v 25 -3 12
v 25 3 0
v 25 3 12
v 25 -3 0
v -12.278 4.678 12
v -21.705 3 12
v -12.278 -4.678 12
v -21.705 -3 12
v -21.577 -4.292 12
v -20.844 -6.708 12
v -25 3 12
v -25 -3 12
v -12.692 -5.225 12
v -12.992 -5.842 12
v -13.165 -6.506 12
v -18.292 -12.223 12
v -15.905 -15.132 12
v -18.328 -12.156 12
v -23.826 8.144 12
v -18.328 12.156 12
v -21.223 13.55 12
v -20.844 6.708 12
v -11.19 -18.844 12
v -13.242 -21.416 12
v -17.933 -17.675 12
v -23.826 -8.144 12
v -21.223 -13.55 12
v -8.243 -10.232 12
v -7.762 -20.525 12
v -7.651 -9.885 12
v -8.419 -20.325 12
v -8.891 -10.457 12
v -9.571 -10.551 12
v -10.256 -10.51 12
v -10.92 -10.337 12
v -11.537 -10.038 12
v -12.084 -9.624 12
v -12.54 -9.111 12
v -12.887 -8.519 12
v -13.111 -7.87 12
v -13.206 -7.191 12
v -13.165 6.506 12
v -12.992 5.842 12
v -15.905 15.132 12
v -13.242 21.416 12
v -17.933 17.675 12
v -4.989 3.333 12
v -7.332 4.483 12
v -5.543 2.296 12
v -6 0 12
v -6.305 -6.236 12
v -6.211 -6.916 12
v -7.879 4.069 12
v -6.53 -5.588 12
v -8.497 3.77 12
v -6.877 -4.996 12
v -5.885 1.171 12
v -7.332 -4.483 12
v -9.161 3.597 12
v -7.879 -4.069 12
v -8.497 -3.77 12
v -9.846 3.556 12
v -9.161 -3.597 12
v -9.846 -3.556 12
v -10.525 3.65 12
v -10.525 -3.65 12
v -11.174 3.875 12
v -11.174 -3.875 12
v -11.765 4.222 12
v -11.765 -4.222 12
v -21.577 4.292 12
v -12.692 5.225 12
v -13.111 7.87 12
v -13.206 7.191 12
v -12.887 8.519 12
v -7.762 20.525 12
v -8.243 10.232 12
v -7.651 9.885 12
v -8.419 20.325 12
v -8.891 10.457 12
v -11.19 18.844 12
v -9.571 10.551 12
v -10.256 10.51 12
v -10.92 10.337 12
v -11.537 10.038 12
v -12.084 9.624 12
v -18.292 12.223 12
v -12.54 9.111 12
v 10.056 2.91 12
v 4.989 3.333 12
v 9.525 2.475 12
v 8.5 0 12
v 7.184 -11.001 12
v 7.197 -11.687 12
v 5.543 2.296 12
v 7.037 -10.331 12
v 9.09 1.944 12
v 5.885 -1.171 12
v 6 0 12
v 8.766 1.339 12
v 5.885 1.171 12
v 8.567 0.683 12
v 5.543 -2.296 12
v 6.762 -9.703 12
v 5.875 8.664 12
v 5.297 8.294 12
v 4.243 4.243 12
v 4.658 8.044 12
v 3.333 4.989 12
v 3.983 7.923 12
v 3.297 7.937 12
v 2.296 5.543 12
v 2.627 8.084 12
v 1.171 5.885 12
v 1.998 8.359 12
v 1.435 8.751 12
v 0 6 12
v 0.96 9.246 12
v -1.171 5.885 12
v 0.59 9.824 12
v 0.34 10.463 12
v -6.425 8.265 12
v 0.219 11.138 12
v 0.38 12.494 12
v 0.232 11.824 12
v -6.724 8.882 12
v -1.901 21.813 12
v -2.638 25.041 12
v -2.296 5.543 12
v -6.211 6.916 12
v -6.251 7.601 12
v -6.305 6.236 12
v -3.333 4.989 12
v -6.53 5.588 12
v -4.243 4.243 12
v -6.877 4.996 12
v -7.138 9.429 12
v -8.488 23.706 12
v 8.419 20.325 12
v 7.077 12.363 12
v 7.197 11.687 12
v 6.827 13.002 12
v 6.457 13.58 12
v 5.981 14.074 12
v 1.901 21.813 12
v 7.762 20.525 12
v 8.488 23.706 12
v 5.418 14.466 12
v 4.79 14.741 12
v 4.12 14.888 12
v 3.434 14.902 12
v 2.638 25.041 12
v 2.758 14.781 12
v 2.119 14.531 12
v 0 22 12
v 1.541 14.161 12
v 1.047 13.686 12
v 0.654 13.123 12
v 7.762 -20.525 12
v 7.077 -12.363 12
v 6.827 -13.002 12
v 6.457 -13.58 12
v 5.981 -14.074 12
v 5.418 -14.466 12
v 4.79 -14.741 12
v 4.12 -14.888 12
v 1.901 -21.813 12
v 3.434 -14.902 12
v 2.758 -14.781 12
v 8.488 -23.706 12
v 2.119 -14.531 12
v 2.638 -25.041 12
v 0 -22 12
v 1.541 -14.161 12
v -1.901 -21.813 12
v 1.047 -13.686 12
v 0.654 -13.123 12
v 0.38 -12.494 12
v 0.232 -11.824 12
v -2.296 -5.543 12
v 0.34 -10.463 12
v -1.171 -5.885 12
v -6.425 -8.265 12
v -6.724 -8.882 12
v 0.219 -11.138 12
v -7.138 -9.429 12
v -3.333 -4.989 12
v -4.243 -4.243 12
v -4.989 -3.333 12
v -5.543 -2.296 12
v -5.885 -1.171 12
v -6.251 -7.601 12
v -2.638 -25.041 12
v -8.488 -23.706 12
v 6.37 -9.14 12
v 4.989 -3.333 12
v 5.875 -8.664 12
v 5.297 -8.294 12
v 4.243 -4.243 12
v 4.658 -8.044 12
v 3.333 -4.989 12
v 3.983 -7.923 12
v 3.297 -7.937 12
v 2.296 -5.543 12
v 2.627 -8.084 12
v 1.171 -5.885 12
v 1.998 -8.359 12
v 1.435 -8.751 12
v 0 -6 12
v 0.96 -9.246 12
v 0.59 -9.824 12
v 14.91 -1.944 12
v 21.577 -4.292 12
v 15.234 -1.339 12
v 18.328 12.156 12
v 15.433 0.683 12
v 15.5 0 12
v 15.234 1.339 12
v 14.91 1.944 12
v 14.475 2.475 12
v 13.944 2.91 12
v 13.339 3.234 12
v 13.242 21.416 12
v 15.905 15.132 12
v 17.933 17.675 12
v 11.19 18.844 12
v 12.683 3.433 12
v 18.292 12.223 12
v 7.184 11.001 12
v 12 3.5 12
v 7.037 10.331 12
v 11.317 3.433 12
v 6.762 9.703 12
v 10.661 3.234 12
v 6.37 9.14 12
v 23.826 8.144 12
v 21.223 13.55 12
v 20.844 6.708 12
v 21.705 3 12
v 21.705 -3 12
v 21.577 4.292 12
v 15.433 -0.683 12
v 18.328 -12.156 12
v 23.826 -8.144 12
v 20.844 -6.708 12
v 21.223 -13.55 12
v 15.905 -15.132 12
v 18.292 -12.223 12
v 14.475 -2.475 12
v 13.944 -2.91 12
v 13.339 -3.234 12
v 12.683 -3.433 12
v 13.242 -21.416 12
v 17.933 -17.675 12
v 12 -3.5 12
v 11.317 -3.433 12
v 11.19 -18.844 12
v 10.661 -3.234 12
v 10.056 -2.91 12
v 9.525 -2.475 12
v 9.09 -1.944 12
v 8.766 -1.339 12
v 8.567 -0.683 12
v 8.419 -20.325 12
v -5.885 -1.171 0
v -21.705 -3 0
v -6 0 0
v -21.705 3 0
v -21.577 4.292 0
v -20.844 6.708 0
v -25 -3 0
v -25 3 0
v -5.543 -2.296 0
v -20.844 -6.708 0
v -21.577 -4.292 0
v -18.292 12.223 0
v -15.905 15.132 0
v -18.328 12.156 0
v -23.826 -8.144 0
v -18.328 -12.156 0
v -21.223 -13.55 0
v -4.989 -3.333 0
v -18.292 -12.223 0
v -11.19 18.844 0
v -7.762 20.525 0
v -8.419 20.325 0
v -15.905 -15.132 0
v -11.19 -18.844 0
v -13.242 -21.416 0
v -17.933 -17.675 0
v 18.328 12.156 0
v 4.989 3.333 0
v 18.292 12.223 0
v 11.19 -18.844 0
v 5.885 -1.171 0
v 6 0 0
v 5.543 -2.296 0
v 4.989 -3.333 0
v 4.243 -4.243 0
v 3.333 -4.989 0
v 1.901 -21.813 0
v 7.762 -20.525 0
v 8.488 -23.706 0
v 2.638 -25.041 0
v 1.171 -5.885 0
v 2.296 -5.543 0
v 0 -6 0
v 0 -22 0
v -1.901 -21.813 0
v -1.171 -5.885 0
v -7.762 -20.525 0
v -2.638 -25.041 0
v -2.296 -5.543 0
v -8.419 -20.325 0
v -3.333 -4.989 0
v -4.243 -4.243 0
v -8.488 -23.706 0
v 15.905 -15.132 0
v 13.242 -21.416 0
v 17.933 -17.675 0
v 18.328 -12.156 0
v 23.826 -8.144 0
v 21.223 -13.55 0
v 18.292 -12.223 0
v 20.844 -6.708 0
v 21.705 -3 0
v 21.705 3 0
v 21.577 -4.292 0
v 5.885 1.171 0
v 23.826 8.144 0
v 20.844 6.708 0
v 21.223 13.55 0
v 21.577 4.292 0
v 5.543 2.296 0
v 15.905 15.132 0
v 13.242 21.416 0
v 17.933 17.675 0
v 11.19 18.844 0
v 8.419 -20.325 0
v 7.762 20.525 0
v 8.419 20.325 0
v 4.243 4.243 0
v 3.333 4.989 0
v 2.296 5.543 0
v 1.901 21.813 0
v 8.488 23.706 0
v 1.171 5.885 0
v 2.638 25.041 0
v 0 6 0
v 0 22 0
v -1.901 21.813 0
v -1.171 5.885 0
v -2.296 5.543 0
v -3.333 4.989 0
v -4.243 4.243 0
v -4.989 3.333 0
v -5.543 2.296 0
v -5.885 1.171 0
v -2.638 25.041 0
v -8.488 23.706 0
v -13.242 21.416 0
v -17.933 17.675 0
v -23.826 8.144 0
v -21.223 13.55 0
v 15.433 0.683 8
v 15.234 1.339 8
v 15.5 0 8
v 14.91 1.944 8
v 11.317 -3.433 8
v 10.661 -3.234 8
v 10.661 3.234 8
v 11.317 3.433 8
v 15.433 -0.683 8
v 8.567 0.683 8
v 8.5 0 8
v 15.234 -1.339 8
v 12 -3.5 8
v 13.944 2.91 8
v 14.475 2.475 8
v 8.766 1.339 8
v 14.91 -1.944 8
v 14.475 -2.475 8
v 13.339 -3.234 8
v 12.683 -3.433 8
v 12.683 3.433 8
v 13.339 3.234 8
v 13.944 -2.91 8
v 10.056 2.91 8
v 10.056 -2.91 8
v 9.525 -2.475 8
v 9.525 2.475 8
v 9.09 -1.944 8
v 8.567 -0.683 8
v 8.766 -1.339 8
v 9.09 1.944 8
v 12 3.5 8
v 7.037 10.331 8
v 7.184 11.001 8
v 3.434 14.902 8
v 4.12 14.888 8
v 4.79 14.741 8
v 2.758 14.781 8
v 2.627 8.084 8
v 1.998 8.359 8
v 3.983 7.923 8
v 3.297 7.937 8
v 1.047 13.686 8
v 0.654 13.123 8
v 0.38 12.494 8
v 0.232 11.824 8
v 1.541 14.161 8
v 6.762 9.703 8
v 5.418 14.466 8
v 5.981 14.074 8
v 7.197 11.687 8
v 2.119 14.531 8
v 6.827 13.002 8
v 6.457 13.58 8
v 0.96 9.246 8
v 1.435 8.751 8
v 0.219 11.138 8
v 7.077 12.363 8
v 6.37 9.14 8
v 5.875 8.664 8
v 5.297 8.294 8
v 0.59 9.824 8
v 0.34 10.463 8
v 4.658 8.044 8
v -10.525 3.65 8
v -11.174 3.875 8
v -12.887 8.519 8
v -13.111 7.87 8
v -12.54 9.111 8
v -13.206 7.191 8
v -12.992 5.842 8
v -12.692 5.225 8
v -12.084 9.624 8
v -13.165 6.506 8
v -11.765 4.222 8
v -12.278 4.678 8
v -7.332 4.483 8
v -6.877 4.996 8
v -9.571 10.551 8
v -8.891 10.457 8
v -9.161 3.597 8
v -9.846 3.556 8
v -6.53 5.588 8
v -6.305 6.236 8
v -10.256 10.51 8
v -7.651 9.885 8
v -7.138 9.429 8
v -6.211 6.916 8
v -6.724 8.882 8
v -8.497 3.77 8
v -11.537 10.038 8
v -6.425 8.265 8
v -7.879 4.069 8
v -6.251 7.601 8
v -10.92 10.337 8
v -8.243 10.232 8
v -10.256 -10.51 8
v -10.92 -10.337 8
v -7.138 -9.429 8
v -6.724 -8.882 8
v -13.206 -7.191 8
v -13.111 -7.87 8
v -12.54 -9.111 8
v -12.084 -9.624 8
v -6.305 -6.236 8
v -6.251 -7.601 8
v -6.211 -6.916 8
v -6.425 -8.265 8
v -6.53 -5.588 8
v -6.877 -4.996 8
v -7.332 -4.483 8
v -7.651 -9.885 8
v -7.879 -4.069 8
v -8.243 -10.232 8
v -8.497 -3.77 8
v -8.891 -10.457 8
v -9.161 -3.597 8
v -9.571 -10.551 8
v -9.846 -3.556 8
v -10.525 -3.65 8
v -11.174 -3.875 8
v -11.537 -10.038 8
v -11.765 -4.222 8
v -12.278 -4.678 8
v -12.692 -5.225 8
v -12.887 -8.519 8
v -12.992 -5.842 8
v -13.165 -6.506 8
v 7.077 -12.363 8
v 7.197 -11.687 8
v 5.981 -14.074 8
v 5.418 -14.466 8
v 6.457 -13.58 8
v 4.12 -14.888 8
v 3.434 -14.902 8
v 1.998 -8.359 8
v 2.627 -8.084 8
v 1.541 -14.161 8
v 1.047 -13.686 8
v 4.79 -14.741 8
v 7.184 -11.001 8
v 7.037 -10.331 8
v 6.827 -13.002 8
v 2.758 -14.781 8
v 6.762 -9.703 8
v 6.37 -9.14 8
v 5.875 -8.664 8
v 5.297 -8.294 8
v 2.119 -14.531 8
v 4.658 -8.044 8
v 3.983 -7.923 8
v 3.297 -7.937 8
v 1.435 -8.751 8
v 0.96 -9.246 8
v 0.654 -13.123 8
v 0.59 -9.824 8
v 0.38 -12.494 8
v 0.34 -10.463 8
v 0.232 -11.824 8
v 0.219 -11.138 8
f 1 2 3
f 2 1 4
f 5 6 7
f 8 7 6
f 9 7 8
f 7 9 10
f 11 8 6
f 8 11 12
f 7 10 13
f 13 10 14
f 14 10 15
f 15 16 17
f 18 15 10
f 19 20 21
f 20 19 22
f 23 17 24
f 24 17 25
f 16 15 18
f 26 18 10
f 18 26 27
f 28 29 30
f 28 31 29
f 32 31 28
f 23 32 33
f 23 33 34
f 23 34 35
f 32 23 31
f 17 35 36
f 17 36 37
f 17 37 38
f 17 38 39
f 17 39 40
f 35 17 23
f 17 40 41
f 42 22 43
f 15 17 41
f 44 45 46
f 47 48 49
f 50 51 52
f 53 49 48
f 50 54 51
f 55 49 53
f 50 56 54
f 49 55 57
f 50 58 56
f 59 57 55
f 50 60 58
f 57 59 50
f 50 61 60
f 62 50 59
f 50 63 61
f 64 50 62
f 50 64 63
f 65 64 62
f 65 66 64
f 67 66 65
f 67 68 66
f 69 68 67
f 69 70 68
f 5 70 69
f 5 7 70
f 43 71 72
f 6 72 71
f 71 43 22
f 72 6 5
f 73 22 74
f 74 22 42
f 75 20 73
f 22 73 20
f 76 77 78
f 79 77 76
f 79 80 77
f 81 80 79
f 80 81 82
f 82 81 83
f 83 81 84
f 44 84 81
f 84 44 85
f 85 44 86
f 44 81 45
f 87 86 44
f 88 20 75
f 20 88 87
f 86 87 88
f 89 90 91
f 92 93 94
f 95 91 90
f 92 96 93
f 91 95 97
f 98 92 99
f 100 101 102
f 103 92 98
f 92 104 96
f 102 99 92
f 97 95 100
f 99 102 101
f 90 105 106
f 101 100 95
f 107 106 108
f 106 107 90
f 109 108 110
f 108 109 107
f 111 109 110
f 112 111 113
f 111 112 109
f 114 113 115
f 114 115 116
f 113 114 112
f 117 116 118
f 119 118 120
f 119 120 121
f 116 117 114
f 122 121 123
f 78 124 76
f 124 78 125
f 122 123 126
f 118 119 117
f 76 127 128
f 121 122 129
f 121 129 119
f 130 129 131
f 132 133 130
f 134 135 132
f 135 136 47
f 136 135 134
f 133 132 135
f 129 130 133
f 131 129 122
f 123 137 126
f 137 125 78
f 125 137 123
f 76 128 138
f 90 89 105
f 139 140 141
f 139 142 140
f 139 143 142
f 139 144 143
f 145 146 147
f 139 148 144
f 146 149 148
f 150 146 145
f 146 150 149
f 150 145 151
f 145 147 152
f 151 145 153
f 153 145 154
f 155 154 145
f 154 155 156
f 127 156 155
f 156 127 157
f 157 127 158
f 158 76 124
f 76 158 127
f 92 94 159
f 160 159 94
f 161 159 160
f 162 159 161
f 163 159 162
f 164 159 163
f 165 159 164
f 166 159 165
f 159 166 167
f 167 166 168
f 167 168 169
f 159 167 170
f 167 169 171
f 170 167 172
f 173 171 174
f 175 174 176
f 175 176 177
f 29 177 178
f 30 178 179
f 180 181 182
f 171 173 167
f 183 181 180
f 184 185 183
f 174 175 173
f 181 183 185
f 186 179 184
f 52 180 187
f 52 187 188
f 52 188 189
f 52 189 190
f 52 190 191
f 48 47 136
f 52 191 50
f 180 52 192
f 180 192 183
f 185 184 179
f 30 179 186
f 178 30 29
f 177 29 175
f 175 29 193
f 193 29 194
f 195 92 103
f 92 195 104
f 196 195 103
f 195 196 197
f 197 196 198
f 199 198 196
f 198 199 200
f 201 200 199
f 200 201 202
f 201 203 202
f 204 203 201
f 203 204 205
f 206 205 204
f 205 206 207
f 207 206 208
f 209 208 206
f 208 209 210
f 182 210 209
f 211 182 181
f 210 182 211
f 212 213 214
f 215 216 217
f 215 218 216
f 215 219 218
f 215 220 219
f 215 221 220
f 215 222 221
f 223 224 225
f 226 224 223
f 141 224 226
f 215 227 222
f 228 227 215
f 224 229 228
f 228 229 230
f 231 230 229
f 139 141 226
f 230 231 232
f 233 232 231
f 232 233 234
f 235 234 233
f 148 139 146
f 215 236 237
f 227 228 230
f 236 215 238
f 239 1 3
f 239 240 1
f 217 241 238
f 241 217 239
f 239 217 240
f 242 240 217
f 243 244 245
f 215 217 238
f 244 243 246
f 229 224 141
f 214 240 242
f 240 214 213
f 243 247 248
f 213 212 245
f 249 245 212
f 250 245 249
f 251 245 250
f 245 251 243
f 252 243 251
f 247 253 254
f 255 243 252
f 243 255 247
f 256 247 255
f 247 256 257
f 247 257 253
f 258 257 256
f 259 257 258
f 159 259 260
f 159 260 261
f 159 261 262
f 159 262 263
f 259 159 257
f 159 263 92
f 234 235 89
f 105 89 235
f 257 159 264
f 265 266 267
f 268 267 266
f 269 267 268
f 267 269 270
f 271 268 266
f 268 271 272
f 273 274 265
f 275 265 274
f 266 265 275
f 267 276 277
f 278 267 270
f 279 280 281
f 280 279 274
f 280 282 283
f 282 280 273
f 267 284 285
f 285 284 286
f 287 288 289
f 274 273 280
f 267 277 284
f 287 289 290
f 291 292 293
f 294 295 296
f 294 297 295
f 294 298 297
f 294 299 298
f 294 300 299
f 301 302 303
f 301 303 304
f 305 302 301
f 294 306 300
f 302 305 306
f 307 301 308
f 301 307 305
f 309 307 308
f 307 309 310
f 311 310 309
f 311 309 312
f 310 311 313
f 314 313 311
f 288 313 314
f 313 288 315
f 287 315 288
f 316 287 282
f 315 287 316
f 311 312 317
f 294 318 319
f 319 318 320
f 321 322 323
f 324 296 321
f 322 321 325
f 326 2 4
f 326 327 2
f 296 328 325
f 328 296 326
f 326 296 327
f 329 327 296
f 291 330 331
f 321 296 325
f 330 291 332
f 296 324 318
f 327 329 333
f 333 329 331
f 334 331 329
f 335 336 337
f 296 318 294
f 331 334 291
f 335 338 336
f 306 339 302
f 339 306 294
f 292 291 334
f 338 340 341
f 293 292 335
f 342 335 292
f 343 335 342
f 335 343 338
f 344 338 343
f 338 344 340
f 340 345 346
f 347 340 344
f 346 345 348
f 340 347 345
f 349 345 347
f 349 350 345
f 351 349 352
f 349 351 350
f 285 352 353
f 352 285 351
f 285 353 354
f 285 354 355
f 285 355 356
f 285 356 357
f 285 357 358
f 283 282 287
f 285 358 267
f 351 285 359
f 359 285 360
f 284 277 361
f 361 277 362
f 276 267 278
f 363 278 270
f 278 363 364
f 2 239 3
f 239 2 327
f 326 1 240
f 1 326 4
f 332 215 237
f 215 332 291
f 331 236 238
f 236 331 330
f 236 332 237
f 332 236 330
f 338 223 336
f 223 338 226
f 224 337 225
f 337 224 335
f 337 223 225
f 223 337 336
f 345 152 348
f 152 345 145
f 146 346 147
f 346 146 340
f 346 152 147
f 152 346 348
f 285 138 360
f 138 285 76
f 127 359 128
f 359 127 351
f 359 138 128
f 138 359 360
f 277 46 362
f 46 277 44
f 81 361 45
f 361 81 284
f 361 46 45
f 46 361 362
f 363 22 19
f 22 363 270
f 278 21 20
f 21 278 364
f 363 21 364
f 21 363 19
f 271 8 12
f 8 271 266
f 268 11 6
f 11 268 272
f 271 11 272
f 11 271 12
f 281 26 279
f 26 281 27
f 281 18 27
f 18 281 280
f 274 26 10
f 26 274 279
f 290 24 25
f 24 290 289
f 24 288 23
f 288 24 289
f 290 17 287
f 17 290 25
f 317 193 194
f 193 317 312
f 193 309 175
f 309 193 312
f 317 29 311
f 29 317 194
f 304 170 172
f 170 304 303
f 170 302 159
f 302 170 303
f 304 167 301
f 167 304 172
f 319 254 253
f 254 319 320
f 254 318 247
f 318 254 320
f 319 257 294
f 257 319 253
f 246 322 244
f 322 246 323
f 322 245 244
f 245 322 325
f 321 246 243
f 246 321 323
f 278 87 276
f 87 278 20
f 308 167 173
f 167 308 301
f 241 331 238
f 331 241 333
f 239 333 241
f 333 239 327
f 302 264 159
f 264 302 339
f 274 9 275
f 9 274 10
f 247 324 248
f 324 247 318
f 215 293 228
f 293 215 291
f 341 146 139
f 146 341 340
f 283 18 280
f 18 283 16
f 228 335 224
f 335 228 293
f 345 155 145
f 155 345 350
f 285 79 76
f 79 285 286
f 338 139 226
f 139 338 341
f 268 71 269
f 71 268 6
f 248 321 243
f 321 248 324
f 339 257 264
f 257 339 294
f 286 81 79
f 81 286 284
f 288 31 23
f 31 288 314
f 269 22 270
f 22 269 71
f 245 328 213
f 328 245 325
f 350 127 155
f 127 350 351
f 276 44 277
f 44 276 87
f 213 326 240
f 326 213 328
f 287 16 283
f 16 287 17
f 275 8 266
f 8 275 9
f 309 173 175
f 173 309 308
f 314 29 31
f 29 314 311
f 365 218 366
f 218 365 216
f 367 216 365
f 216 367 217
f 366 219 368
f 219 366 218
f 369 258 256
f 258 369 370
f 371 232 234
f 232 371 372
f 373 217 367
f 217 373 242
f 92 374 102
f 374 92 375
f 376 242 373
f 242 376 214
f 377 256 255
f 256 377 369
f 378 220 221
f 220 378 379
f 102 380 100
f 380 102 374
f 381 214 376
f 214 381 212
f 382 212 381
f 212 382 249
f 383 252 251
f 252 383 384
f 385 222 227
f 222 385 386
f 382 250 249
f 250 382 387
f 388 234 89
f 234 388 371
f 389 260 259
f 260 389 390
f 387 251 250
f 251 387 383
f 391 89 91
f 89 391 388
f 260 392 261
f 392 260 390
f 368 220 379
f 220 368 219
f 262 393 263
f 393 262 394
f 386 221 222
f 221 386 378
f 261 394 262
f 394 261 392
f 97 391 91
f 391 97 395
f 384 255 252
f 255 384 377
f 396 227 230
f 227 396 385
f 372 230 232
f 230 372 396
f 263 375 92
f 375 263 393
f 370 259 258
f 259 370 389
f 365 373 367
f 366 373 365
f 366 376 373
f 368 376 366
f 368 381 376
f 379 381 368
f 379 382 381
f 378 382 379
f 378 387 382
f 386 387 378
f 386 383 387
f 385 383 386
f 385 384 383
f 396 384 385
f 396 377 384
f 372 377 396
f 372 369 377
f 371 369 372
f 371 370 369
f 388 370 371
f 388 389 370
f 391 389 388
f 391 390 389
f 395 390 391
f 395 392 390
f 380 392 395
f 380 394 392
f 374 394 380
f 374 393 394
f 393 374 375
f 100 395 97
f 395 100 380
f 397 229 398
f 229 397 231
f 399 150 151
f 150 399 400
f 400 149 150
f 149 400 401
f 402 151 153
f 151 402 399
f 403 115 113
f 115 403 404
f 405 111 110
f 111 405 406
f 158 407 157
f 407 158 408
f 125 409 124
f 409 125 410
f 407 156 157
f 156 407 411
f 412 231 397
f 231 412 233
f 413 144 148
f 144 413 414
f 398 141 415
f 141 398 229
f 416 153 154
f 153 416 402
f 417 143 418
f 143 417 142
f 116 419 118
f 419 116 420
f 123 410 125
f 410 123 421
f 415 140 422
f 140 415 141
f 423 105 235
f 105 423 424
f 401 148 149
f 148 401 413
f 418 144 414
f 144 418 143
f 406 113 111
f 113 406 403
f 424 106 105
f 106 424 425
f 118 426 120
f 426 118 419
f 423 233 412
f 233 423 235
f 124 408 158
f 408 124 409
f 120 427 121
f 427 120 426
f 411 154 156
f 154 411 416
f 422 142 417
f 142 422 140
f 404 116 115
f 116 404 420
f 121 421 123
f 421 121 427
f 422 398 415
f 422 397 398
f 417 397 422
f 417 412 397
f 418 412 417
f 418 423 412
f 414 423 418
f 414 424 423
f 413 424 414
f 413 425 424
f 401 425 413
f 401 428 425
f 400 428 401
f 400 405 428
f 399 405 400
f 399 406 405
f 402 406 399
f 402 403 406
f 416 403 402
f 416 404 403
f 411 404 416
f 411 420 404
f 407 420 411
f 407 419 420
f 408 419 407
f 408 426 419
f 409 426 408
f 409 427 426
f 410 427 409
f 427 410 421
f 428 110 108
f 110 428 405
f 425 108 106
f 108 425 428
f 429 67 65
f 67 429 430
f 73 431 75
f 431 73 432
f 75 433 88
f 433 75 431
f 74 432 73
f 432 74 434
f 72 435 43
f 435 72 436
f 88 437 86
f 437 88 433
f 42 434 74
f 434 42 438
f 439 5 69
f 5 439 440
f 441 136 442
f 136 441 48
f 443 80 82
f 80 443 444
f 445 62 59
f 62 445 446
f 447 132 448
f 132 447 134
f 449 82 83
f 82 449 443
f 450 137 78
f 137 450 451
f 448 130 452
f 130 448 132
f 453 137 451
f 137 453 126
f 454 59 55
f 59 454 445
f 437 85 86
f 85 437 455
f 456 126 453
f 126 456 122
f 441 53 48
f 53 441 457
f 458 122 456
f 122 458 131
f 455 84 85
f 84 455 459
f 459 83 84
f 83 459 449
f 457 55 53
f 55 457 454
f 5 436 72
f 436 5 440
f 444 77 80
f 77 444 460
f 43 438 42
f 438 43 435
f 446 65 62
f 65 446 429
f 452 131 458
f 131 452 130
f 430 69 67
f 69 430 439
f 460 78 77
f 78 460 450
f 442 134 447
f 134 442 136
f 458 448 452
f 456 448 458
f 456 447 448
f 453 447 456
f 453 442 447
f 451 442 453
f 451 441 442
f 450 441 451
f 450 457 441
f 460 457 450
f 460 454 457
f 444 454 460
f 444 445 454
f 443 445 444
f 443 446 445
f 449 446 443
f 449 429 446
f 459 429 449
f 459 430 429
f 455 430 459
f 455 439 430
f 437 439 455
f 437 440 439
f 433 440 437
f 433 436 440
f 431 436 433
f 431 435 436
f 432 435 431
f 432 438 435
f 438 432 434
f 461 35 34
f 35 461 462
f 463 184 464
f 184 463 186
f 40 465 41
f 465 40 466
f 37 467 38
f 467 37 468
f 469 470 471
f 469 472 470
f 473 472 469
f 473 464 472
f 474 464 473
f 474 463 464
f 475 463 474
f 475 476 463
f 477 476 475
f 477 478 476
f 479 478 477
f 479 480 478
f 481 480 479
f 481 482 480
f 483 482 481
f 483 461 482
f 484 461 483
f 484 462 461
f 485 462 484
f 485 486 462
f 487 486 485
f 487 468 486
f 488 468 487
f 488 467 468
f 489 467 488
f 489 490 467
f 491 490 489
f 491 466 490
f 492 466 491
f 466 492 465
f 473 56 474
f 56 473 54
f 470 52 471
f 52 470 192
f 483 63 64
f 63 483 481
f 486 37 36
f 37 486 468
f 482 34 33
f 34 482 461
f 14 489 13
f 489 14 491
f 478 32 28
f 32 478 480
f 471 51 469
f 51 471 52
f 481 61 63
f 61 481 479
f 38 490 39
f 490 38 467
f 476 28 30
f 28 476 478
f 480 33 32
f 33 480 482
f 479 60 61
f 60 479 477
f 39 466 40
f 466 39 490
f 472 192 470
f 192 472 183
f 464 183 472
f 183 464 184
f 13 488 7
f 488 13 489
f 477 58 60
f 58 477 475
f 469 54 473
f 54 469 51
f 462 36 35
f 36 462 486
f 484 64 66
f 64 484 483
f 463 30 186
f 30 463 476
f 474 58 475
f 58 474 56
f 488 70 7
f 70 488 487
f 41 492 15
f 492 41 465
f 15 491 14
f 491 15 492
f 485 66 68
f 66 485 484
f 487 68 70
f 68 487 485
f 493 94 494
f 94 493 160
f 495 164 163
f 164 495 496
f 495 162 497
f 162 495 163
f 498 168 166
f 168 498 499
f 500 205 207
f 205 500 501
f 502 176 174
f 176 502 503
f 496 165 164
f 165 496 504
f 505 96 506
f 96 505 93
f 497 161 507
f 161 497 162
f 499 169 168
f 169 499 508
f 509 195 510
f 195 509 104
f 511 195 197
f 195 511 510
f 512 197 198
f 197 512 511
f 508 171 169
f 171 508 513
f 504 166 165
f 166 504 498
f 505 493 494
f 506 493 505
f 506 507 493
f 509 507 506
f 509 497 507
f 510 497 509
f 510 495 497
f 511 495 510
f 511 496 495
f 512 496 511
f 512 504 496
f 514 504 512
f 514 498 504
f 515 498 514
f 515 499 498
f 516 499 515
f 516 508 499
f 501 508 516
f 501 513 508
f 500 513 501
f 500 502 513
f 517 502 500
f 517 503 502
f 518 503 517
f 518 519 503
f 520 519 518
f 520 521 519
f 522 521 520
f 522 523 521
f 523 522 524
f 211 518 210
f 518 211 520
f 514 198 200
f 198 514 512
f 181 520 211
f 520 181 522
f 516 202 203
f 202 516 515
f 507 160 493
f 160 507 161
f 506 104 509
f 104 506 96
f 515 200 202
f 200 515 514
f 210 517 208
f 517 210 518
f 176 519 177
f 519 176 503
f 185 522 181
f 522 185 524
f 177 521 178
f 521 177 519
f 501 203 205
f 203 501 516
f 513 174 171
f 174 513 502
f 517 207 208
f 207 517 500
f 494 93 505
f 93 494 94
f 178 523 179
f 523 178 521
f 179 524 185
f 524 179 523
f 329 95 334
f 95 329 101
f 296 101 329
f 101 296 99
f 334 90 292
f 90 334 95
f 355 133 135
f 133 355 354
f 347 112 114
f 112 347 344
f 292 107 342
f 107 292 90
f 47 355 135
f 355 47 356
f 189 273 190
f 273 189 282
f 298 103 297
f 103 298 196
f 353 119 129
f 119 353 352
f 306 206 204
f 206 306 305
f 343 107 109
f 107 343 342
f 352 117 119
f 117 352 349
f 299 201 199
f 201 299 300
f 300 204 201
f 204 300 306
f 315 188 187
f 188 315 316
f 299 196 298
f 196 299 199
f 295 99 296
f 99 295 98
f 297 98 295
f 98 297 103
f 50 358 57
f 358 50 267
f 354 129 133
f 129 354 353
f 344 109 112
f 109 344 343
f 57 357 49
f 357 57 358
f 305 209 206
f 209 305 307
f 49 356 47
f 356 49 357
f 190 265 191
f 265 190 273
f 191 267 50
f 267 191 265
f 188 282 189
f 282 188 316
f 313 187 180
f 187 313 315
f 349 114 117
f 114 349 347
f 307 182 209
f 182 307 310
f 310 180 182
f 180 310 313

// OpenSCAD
$fn = 32;
// target_bbox: 50, 50.08, 12
// ----------------------------------------------------------------------
// Spur blank: lightened gear blank
// ----------------------------------------------------------------------

// --- parameters (mm) ---
disc_r = 22;              // blank root radius
disc_t = 12;              // blank thickness
n_teeth = 14;             // stub tooth count
tooth_w = 6;              // tooth width at the root
tooth_h = 3;              // tooth height above the root
bore_r = 6;               // central bore radius
ring_r = 12;              // lightening pocket ring radius
pocket_r = 3.5;           // lightening pocket radius

out_r = disc_r + tooth_h;  // tip radius
bbox_x = 50.0;  // measured width over the teeth
bbox_y = 50.08;  // measured depth over the teeth

difference() {
union() {
  cylinder(r = disc_r, h = disc_t);
  for (i = [0 : n_teeth - 1])
    rotate([0, 0, i * 360 / n_teeth])
      translate([disc_r - 1, -tooth_w / 2, 0])
        cube([tooth_h + 1, tooth_w, disc_t]);
}
  translate([0, 0, -1]) cylinder(r = bore_r, h = disc_t + 2);
  for (i = [0 : 5])
    rotate([0, 0, i * 72])
      translate([ring_r, 0, disc_t - 4])
        cylinder(r = pocket_r, h = 5);
}
